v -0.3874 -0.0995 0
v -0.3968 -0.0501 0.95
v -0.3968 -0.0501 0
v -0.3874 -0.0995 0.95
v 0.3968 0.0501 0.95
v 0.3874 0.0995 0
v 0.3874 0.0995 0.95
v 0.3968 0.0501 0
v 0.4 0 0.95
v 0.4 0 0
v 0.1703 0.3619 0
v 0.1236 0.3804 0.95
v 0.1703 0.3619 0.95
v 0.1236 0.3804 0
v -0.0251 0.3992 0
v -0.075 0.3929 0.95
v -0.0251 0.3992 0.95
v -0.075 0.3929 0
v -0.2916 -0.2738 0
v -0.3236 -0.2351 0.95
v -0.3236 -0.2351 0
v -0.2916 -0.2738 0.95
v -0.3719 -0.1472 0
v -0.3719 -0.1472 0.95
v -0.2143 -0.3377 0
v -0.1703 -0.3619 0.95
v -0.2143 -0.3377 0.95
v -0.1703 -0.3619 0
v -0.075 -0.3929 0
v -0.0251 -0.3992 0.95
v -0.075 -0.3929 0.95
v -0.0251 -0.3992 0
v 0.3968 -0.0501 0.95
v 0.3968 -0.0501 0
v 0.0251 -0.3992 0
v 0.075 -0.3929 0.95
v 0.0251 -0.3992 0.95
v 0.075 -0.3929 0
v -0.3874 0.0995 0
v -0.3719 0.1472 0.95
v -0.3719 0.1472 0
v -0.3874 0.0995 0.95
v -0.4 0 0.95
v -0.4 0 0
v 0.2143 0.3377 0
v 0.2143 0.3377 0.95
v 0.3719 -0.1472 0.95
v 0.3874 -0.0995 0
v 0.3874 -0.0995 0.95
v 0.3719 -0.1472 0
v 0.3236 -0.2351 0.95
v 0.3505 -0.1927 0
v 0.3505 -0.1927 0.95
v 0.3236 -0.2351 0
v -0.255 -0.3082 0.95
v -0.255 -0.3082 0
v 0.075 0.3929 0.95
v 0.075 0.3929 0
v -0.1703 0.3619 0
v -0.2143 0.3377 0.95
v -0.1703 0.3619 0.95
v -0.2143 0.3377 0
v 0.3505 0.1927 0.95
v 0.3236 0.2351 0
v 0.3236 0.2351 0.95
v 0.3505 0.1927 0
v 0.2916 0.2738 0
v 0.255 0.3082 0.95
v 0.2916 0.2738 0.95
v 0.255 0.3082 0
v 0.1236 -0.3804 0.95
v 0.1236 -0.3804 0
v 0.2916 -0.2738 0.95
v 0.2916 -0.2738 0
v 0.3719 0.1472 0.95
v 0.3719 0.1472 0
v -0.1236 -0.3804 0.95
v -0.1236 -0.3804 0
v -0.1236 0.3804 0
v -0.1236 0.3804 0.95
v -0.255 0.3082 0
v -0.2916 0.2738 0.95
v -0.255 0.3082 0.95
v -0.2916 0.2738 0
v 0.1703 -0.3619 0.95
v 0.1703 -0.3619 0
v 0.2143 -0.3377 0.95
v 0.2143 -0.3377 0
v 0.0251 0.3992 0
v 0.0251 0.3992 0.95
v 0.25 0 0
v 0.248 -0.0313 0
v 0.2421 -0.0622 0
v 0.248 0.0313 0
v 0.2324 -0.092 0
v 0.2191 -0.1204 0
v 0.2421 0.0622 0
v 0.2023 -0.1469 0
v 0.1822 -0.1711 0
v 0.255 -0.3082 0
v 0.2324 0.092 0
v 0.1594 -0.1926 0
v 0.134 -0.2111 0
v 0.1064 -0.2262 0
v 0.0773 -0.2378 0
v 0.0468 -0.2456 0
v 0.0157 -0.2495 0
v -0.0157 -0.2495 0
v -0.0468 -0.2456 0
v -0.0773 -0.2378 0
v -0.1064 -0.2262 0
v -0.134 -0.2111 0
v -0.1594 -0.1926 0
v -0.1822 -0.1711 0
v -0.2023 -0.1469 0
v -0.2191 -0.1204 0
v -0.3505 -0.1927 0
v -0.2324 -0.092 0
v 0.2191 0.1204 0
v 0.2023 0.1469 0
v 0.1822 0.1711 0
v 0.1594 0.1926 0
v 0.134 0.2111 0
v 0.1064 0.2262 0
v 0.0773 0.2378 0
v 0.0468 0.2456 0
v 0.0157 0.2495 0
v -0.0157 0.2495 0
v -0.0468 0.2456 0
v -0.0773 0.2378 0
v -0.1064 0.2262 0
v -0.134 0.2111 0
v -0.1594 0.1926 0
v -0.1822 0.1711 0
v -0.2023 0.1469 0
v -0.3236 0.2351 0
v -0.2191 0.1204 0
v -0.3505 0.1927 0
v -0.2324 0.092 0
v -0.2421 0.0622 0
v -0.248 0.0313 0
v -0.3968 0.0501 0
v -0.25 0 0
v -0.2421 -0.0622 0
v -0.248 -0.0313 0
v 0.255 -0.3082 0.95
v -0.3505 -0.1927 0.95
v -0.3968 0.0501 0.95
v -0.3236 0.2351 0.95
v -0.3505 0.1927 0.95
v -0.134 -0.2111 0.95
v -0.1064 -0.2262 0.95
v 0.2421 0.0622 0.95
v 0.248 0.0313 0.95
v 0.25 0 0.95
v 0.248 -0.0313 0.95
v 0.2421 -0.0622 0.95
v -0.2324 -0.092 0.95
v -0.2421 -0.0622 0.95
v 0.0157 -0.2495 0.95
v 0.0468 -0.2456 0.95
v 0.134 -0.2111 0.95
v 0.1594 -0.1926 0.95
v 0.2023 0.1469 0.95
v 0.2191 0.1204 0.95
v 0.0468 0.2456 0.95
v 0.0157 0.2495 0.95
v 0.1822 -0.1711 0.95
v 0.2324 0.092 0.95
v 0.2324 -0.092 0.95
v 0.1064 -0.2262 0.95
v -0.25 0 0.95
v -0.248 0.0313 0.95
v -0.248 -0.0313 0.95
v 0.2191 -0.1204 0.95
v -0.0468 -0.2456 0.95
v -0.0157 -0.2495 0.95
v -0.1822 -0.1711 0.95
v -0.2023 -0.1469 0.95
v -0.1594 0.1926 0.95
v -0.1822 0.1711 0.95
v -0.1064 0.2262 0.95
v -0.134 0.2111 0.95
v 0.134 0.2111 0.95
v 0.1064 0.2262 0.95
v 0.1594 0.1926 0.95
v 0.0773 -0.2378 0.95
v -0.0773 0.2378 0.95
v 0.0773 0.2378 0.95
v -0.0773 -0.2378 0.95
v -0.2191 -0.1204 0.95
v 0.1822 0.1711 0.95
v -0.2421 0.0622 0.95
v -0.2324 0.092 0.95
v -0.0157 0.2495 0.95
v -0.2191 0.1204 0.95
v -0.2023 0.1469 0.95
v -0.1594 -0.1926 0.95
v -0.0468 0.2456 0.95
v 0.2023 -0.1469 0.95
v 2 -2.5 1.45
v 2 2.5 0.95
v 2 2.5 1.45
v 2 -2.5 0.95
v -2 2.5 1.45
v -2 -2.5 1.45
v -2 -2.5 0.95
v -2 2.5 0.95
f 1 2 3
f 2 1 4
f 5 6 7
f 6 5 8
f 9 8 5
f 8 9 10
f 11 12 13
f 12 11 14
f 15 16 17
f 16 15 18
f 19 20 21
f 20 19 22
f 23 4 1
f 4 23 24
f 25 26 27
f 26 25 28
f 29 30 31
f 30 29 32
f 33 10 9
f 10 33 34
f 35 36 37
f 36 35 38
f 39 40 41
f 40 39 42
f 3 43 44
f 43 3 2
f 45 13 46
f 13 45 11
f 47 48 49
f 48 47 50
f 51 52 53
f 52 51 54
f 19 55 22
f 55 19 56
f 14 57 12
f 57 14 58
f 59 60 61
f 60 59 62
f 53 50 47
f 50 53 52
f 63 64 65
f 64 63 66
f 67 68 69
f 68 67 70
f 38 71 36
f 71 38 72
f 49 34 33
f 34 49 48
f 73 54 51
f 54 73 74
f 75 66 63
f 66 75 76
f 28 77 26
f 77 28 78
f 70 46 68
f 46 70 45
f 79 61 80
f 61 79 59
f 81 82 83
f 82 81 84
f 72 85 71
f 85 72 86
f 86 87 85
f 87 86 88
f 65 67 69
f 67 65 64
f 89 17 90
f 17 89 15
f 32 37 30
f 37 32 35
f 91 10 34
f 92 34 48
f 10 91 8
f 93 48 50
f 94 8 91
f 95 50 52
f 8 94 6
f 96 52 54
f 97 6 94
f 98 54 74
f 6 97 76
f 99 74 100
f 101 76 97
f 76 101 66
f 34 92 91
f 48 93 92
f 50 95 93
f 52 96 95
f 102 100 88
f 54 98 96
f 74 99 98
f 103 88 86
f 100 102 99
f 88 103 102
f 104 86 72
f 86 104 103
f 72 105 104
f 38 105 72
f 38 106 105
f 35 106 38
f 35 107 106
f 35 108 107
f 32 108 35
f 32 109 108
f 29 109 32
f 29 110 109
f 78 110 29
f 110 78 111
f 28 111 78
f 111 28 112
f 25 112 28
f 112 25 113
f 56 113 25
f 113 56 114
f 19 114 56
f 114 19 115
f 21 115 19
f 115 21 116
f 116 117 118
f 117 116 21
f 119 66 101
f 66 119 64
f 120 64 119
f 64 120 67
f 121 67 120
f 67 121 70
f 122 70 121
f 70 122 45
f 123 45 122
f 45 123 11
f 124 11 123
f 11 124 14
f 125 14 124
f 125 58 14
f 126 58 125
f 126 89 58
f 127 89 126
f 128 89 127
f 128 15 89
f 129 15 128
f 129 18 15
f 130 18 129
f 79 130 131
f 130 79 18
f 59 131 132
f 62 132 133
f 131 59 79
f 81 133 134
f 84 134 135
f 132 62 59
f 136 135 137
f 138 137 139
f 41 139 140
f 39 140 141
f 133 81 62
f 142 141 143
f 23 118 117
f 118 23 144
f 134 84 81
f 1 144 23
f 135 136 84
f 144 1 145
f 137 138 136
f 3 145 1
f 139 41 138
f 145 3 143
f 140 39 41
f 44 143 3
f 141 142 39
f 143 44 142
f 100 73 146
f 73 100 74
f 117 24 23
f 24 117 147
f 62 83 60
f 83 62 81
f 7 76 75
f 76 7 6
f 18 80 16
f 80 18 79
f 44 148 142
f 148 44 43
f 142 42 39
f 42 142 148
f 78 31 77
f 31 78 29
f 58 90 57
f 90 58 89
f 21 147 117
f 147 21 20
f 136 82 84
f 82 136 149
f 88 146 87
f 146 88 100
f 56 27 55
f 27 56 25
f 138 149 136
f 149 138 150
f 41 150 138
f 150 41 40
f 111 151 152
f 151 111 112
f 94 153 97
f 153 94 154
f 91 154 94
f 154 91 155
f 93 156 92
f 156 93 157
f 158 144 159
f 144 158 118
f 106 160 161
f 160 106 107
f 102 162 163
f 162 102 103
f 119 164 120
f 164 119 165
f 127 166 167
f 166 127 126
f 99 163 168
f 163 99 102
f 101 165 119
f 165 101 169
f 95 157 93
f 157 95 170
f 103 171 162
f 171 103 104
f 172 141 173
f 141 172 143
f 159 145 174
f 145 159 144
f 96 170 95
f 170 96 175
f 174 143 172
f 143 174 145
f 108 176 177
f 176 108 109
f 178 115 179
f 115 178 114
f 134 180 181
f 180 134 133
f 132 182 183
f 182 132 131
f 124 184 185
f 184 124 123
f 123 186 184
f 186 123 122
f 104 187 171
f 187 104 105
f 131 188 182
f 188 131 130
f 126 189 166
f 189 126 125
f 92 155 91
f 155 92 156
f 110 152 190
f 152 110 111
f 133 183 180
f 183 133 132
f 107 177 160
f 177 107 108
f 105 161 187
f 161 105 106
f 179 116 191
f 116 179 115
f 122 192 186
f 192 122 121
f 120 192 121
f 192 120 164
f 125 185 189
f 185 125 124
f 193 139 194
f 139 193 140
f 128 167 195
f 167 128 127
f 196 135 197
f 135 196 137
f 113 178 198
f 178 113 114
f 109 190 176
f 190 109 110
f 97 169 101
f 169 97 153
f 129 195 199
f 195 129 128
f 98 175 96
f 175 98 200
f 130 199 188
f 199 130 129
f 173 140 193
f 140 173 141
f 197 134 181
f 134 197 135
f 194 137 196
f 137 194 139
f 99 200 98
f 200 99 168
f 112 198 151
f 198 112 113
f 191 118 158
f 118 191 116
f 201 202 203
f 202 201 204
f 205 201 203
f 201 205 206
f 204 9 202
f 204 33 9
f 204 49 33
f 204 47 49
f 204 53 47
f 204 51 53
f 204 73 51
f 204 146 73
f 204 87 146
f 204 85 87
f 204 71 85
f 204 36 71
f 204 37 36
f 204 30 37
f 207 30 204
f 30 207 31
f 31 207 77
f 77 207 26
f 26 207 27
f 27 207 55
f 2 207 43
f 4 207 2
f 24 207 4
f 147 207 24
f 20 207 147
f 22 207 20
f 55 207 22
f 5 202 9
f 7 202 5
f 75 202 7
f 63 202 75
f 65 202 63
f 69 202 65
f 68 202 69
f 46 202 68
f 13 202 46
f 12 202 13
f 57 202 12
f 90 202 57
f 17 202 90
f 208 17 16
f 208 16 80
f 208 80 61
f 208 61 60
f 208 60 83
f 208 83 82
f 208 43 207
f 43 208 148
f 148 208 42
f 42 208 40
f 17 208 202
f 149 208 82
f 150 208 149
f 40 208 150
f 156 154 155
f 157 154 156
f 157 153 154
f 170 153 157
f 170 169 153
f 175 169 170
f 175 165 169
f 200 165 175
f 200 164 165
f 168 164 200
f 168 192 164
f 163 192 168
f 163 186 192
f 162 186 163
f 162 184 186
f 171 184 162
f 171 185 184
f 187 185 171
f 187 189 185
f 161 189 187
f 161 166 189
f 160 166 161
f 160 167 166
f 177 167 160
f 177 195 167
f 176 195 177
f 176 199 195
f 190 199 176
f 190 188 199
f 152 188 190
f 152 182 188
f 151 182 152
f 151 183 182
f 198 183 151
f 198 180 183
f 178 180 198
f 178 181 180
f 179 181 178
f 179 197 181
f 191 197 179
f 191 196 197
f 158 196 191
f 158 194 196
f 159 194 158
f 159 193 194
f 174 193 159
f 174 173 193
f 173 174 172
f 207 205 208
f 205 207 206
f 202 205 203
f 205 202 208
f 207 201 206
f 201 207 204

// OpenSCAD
//Stepper Shaft

shaftHeight = 1.2;
shaftDiameter = 0.8;
shaftThickness = 0.3;

difference(){
    cylinder(h=shaftHeight,d=shaftDiameter,center=false,$fn=50);
    cylinder(h=shaftHeight,d=shaftDiameter-shaftThickness,center=false,$fn=50);
}

//the Plate
plate = [4,5,0.5];
translate([0,0,shaftHeight]) cube(plate, center=true);

//translate([4,0,0]) servo();

//Servo
module servo() {
    servoBody = [3.54,4.136,2.05];
    servoHead = [0.24,0.7,1.89];
    servoHeadXShift = 0.6;

    servoHead1Shift = [servoBody.x/2 - servoHeadXShift - servoHead.x/2 , 
                      servoBody.y/2 + servoHead.y/2, 0];
    servoHead2Shift = [servoHead1Shift.x , -servoHead1Shift.y, servoHead1Shift.z];

   
        cube(servoBody,center=true);
        translate(servoHead1Shift) servoHead();
        translate(servoHead2Shift) servoHead();
    


    module servoHead() {
        servoHeadHoleDiameter = 0.4;
        
        servoHeadHole1Shift =[-servoHead.x/2,0.05,((servoHead.z/2)-servoHeadHoleDiameter)/2];
        servoHeadHole2Shift =[-servoHead.x/2,0.05,-((servoHead.z/2)-servoHeadHoleDiameter)/2];
        
        difference(){
            cube(servoHead, center=true);
            translate(servoHeadHole1Shift) rotate([0,90,0]) cylinder(h=servoHead.x,d=servoHeadHoleDiameter,$fn=50);
            translate(servoHeadHole2Shift) rotate([0,90,0]) cylinder(h=servoHead.x,d=servoHeadHoleDiameter,$fn=50);
        }
    }
}
